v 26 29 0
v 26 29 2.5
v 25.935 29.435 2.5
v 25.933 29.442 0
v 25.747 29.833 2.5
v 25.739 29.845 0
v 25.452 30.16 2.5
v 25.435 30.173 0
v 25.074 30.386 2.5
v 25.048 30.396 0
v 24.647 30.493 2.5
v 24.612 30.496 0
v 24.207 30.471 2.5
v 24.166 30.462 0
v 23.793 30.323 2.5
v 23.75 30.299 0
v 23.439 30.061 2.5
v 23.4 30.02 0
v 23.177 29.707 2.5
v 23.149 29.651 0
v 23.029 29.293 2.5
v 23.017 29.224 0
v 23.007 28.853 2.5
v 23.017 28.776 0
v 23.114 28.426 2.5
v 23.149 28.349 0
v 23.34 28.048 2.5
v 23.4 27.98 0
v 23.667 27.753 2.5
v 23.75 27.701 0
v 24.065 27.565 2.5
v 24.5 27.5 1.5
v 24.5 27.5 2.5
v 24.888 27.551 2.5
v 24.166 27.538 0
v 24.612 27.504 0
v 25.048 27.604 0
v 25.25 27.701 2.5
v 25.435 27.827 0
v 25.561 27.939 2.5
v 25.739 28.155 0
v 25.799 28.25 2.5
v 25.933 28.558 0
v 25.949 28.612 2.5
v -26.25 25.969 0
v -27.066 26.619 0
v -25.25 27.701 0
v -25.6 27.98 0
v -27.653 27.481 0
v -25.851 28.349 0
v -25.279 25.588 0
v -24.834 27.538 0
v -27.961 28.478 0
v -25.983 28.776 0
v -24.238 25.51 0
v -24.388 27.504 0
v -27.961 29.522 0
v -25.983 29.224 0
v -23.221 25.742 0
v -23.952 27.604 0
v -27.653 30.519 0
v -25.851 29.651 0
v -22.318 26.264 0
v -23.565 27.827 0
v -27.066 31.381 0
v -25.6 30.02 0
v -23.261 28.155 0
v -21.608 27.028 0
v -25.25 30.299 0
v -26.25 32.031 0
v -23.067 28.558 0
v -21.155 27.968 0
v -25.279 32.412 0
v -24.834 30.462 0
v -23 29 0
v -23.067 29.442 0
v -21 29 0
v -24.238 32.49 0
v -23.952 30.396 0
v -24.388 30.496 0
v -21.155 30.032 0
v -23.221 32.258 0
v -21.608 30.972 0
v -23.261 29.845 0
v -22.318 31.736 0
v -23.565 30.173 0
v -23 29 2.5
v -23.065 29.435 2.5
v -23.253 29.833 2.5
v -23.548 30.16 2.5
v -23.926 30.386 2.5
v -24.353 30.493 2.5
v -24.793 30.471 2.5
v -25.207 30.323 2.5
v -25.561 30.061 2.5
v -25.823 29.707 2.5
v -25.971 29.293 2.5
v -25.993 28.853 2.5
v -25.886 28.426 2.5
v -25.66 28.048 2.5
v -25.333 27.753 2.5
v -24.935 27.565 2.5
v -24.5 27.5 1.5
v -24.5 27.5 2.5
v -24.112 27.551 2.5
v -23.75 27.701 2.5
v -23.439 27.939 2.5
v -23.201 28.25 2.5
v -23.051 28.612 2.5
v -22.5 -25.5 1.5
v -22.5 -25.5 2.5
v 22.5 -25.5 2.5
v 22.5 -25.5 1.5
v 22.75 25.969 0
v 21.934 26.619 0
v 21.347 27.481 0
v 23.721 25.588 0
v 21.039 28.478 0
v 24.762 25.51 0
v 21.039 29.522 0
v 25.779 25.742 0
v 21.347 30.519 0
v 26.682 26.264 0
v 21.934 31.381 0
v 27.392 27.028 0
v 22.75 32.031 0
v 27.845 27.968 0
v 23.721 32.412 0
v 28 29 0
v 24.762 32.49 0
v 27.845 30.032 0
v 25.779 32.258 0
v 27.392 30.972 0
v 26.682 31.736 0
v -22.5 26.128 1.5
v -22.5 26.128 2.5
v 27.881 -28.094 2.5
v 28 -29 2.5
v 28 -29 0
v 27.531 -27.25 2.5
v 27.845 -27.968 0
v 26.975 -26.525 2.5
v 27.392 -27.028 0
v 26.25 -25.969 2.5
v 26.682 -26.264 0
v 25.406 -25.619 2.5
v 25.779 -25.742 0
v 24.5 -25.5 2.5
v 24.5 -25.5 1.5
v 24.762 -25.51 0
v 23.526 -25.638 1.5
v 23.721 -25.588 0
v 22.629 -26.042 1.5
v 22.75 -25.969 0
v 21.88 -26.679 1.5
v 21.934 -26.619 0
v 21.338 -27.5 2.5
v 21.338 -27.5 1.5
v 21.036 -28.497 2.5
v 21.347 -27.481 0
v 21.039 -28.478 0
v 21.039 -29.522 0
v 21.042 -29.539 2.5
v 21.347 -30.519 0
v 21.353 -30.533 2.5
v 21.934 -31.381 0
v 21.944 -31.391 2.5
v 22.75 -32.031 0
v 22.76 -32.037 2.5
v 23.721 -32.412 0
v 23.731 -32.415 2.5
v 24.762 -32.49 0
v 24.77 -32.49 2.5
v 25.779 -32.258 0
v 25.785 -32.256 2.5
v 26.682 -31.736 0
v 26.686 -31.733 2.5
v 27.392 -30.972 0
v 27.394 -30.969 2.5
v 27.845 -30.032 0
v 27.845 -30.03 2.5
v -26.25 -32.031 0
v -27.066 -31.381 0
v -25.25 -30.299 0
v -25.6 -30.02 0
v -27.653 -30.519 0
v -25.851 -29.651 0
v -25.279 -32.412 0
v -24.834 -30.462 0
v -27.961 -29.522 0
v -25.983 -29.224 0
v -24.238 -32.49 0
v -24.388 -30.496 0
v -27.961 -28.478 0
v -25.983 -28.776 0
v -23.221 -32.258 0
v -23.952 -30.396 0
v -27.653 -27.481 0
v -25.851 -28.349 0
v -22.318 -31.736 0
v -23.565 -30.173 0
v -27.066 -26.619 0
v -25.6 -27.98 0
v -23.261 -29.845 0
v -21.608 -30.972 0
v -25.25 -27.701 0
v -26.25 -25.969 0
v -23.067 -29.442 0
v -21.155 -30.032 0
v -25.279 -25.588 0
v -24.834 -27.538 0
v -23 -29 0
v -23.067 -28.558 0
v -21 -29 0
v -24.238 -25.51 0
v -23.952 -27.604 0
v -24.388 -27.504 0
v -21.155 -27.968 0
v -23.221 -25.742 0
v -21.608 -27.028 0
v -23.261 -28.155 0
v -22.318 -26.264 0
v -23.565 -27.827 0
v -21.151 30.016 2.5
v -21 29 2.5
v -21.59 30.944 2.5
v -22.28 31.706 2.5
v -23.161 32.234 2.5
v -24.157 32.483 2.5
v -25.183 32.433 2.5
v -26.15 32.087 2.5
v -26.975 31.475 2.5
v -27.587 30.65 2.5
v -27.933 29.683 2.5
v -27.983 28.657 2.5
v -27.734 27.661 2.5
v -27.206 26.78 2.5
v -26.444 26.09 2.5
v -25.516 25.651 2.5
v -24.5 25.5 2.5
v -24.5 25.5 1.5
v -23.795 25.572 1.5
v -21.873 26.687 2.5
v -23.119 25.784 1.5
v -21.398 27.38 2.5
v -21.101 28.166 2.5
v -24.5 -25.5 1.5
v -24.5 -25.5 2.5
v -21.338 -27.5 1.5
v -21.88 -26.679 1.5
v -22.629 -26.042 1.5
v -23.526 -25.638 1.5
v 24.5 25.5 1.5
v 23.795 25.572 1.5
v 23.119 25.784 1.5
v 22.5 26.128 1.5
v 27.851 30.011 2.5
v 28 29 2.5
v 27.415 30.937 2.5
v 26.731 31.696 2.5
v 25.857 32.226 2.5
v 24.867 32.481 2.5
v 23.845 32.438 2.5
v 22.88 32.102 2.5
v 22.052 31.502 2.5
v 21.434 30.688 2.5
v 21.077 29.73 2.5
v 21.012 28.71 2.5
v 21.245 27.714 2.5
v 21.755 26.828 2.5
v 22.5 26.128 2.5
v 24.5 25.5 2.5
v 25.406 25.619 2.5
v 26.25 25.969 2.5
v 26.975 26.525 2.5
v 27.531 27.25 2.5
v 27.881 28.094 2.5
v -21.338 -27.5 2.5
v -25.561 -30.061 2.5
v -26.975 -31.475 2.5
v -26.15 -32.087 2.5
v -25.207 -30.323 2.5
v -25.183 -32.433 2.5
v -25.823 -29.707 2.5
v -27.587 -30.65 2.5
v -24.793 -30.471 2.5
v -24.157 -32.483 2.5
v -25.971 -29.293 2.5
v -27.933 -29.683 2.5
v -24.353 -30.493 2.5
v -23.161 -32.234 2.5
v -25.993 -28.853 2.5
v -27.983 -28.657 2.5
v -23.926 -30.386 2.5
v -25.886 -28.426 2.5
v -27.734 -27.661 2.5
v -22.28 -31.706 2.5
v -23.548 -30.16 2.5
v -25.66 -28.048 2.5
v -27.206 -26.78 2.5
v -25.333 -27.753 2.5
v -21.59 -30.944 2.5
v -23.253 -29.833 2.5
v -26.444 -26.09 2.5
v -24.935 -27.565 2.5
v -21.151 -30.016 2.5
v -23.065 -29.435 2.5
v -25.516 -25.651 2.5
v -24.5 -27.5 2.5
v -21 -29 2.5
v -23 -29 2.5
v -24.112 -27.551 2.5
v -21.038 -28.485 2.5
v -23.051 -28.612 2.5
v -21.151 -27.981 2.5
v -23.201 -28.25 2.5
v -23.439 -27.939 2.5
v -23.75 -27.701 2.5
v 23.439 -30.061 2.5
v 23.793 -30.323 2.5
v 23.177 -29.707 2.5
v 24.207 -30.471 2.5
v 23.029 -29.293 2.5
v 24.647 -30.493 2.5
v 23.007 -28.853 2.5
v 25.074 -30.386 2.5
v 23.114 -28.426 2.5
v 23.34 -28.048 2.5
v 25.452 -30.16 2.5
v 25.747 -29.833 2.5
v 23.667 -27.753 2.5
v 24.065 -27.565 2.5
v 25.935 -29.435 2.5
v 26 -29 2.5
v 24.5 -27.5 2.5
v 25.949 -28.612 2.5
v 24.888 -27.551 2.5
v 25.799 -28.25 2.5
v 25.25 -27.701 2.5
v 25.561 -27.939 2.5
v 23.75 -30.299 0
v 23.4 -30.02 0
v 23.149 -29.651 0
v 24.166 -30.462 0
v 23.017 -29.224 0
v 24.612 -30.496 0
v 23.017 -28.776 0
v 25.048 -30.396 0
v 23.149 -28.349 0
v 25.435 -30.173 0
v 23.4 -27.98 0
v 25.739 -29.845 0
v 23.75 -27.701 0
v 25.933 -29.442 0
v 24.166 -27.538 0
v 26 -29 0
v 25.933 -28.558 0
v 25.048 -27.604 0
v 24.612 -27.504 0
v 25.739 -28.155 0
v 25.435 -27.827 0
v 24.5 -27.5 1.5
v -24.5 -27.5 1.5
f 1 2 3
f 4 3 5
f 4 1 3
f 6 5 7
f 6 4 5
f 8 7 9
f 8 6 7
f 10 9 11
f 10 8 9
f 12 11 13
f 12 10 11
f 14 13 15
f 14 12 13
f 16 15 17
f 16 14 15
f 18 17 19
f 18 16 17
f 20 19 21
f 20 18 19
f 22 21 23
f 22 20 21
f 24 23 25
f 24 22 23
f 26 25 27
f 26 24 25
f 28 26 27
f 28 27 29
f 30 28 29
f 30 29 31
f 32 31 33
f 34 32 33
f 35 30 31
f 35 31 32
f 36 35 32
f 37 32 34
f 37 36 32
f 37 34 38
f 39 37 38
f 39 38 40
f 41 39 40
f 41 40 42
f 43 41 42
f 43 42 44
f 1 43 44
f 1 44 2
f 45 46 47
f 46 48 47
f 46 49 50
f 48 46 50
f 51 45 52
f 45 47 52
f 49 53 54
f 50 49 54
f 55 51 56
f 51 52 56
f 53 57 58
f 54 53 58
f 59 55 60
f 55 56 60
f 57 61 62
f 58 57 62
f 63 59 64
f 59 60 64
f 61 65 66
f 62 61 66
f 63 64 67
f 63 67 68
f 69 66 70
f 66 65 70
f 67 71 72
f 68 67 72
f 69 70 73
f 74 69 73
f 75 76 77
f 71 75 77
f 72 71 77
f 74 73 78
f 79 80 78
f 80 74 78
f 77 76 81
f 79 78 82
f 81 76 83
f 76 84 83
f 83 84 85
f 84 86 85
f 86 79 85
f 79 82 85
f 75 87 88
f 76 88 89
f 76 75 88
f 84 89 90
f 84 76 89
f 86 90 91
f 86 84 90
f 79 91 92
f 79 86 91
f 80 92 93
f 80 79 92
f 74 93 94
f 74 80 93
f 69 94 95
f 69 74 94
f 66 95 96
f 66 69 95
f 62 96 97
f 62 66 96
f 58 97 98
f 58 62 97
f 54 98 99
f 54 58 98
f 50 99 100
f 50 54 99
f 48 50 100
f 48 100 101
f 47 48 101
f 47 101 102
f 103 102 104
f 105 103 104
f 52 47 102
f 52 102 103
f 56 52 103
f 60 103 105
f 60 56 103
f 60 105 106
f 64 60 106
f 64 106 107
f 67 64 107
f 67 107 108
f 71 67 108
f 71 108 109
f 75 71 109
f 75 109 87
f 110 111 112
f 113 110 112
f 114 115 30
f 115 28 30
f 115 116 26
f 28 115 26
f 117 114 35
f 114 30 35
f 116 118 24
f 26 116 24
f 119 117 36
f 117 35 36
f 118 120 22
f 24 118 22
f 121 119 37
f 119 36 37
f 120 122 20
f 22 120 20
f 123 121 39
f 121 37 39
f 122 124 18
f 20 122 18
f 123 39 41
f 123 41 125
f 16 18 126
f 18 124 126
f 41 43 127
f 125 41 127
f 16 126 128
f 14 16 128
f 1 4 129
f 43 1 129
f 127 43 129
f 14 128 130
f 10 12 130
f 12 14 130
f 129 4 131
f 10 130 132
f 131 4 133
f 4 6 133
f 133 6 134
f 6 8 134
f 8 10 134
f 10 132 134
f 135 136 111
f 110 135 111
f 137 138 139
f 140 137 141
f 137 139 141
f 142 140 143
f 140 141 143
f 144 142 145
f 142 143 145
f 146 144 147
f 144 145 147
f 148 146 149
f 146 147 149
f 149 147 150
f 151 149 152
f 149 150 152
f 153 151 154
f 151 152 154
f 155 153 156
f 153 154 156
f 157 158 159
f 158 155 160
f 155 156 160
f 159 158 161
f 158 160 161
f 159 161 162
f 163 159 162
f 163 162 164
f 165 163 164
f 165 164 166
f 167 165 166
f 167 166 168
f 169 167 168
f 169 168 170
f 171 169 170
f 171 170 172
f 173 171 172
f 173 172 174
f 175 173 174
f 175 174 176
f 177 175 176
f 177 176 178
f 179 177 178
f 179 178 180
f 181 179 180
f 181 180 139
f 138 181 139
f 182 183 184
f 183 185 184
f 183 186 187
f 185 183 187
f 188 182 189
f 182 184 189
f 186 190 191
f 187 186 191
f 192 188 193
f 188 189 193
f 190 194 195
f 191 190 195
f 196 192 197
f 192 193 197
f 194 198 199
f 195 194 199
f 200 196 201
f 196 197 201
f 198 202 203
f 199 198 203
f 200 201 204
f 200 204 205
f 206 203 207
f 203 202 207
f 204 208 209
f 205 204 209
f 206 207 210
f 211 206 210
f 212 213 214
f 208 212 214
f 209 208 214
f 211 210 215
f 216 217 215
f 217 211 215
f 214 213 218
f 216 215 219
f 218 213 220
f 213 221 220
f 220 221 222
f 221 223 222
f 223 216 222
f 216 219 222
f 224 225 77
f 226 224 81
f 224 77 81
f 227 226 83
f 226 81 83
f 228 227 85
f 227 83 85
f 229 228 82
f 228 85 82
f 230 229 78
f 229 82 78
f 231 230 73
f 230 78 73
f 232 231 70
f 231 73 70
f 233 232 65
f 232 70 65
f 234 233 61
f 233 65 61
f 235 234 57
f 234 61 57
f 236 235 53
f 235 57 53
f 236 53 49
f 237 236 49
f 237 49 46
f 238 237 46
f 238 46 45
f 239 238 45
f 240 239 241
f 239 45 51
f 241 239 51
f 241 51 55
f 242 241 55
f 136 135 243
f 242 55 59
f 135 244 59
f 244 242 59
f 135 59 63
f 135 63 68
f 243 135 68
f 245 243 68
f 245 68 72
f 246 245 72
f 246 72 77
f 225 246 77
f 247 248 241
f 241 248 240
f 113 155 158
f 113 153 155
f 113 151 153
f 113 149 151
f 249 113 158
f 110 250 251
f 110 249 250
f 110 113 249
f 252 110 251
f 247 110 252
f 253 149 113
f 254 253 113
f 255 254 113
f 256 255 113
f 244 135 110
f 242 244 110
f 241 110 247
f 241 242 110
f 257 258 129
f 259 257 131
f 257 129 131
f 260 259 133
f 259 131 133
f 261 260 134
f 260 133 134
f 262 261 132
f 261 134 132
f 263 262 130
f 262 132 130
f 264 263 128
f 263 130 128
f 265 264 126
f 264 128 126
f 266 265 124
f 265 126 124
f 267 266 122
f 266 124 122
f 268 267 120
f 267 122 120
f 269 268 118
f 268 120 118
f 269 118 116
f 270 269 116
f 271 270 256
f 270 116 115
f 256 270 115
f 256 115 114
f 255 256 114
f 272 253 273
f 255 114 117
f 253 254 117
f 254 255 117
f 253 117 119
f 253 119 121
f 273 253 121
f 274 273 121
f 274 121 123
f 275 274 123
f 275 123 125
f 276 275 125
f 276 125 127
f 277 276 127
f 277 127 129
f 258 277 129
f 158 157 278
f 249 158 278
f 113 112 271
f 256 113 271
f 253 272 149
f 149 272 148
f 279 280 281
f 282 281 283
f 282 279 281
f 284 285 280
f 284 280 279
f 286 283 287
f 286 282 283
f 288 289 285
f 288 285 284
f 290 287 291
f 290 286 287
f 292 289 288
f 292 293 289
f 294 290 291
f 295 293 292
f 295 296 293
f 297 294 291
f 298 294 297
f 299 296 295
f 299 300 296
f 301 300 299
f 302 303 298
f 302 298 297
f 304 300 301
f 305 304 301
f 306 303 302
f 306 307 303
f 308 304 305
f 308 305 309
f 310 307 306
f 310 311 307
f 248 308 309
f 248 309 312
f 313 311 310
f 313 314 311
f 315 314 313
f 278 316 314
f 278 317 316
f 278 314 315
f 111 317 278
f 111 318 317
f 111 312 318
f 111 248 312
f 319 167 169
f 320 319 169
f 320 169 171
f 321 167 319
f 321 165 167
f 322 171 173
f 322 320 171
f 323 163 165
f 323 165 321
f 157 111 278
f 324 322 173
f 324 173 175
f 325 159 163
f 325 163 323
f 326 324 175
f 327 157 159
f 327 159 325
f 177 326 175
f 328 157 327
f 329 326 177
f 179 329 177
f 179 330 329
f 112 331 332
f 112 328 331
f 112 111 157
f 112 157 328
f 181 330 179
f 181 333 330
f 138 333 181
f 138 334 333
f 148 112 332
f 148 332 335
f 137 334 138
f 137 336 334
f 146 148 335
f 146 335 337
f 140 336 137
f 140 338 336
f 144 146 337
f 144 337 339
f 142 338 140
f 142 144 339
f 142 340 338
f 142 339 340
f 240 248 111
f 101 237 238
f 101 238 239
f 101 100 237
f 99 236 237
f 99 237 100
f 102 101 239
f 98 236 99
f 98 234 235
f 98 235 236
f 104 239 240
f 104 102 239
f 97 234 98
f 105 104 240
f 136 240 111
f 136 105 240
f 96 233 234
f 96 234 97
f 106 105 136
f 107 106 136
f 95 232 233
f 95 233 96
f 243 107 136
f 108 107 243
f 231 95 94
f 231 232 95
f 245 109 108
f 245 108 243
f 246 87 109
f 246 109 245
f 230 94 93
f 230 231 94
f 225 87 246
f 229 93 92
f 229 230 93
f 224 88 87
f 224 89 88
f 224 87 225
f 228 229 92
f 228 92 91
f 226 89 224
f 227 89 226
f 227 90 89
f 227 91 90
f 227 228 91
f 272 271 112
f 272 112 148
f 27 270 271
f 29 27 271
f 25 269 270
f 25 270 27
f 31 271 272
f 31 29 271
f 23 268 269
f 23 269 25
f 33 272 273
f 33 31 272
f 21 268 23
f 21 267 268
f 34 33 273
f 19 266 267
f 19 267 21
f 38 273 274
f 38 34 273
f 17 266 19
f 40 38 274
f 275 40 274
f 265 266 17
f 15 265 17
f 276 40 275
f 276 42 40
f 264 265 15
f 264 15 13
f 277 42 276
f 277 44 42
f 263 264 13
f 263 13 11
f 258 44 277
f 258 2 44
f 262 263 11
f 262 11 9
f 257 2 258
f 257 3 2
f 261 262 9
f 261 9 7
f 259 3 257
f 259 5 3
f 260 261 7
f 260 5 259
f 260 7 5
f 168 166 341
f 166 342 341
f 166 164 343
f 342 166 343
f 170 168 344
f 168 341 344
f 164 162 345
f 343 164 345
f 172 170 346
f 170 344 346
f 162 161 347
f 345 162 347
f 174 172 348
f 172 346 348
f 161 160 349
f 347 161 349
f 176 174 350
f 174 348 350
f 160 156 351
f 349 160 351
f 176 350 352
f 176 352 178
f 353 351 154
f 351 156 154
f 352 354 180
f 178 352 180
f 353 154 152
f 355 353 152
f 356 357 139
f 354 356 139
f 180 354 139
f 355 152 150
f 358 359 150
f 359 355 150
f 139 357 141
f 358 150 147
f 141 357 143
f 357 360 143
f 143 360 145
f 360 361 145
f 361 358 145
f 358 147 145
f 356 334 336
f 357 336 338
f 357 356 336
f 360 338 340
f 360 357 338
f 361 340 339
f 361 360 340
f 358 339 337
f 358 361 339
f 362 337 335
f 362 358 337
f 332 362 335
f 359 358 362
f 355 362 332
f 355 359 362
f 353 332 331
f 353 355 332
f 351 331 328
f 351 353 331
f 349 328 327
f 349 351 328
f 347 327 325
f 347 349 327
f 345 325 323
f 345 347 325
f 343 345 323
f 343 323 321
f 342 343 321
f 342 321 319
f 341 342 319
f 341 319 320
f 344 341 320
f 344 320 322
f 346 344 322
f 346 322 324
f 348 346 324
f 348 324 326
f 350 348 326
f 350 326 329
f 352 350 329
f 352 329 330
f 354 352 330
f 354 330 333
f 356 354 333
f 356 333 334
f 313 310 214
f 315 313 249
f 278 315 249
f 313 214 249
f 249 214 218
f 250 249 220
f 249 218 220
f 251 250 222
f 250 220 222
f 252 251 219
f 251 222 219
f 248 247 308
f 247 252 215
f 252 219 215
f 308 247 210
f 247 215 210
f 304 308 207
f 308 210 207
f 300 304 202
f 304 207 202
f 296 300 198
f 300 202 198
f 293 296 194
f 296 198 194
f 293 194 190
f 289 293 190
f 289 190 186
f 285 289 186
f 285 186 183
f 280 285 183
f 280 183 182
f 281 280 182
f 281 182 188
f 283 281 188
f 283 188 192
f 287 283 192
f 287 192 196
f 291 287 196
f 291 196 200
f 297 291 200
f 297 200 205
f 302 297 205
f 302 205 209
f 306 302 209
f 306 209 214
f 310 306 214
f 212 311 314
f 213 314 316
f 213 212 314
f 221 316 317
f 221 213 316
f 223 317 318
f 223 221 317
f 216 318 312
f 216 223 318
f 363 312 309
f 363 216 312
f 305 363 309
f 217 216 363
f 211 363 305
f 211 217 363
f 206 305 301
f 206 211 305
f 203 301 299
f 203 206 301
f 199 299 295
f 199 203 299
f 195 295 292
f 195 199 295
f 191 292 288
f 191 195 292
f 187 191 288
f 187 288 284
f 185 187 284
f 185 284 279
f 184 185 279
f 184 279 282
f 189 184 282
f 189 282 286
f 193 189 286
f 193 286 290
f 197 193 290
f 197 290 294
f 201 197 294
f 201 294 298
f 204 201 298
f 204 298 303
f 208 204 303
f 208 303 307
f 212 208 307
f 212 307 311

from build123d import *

# Parameters (mm, degrees)
ESQUISSE1_R          = 3.5
ESQUISSE1_R_2        = 1.5
BOSS_EXTRU_2_DEPTH   = 2.5
BOSS_EXTRU_2_2_DEPTH = 2.5
BOSS_EXTRU_2_3_DEPTH = 2.5
BOSS_EXTRU_2_4_DEPTH = 2.5
BOSS_EXTRU_3_DEPTH   = 1


with BuildPart() as part:
    # Esquisse1 → Boss.-Extru.2 (new body)
    with BuildSketch(Plane.XY):
        with Locations((-24.5, 29)):
            Circle(ESQUISSE1_R)
        with Locations((-24.5, 29)):
            Circle(ESQUISSE1_R_2, mode=Mode.SUBTRACT)
    extrude(amount=BOSS_EXTRU_2_DEPTH)



with BuildPart() as body_2:
    # Esquisse1 → Boss.-Extru.2 2 (new body)
    with BuildSketch(Plane.XY):
        with Locations((24.5, 29)):
            Circle(ESQUISSE1_R)
        with Locations((24.5, 29)):
            Circle(ESQUISSE1_R_2, mode=Mode.SUBTRACT)
    extrude(amount=BOSS_EXTRU_2_2_DEPTH)


with BuildPart() as body_3:
    # Esquisse1 → Boss.-Extru.2 3 (new body)
    with BuildSketch(Plane.XY):
        with Locations((-24.5, -29)):
            Circle(ESQUISSE1_R)
        with Locations((-24.5, -29)):
            Circle(ESQUISSE1_R_2, mode=Mode.SUBTRACT)
    extrude(amount=BOSS_EXTRU_2_3_DEPTH)


with BuildPart() as body_4:
    # Esquisse1 → Boss.-Extru.2 4 (new body)
    with BuildSketch(Plane.XY):
        with Locations((24.5, -29)):
            Circle(ESQUISSE1_R)
        with Locations((24.5, -29)):
            Circle(ESQUISSE1_R_2, mode=Mode.SUBTRACT)
    extrude(amount=BOSS_EXTRU_2_4_DEPTH)


with BuildPart() as part_1:
    add(part.part)

    add(body_2.part)  # Boss.-Extru.3 merges body 2

    add(body_3.part)  # Boss.-Extru.3 merges body 3

    add(body_4.part)  # Boss.-Extru.3 merges body 4
    # Esquisse3 → Boss.-Extru.3 (add)
    with BuildSketch(Plane.XY.offset(2.5)):
        Polygon((24.5, 27.5), (24.5, -27.5), (-24.5, -27.5), (-24.5, 27.5), (-22.5, 27.5), (-22.5, -25.5), (22.5, -25.5), (22.5, 27.5), align=None)
    extrude(amount=-BOSS_EXTRU_3_DEPTH)


solid = part_1.part
